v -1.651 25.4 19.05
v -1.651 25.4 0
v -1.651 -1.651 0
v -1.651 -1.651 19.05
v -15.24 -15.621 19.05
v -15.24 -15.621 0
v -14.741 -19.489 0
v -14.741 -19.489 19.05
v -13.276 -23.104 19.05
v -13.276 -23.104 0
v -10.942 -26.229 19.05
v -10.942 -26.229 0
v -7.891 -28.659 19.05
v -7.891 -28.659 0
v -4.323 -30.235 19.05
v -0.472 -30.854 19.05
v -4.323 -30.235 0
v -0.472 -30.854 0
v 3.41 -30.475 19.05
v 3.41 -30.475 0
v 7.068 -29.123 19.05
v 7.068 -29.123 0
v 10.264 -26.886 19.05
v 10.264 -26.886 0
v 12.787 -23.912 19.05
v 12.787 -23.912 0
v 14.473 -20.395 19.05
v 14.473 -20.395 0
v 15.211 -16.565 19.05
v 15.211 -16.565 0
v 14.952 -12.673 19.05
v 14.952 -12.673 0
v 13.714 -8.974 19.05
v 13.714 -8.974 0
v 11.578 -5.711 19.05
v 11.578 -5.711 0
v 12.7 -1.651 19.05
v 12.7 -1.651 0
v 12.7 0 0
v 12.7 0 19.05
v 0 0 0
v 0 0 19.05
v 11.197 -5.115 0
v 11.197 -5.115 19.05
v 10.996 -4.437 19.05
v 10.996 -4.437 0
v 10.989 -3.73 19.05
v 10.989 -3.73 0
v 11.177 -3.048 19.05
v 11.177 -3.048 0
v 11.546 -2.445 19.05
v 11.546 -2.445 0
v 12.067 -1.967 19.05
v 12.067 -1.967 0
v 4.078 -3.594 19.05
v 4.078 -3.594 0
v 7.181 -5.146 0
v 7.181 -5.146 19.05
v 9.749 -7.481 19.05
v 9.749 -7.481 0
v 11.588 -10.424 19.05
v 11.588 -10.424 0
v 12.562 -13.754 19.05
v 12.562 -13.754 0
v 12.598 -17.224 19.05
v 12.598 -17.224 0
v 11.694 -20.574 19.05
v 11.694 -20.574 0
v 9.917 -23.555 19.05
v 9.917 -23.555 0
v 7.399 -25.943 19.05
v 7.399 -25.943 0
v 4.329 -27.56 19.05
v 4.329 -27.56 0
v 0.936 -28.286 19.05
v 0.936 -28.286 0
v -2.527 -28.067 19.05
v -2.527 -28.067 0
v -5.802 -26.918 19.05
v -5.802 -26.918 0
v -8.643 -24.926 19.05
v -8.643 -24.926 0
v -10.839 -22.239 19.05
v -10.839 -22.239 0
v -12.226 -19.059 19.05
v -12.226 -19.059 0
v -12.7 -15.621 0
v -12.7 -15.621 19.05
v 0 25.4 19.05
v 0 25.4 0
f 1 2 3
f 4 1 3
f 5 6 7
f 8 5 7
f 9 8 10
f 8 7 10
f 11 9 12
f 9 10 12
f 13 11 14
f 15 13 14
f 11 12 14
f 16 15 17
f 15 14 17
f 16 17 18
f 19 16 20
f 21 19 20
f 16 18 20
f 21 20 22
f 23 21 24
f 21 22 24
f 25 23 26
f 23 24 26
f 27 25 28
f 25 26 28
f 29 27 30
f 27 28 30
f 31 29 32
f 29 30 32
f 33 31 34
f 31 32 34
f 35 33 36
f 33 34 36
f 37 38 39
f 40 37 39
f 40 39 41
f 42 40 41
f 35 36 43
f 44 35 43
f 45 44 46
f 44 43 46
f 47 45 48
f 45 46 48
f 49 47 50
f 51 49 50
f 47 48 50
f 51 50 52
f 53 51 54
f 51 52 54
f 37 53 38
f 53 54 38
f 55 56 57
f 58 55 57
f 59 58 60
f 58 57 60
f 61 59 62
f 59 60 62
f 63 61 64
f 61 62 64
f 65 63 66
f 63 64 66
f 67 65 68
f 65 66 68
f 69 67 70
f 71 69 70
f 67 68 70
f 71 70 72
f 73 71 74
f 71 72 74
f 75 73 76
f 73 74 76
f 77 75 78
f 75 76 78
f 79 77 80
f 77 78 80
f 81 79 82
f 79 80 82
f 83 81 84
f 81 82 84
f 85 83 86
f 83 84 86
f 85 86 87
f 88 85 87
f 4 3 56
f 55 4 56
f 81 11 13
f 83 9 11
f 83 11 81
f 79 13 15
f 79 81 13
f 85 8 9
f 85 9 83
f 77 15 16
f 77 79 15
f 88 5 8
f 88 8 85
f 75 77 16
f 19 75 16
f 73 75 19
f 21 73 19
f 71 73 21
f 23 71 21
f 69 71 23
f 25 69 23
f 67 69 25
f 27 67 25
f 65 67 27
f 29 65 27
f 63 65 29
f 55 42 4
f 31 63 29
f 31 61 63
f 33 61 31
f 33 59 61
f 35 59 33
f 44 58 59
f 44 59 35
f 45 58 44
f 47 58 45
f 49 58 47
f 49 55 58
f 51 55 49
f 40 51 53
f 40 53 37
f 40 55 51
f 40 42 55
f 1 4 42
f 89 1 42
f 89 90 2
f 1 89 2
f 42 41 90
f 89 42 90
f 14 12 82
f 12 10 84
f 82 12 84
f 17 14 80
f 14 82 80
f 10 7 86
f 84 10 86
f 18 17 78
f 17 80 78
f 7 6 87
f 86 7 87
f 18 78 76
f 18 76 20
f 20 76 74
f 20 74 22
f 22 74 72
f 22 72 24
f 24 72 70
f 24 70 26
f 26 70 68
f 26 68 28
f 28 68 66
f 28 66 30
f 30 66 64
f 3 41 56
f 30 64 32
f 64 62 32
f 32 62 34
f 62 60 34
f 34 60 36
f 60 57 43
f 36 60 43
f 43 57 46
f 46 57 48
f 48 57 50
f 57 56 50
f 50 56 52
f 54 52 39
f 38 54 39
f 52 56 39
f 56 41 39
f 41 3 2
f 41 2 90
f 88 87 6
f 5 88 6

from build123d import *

# Parameters (mm, degrees)
F1_DEPTH    = 19.05
F2_T1_DEPTH = 19.05


# Not quite as in the source:
# - a fillet or chamfer that OpenCascade refuses, or shapes differently, is made with other operations: its cross-section is extruded or revolved along the edge and cut away or added


with BuildPart() as f1:
    # F0 (on Top) → F1 (new body)
    with BuildSketch(Plane.XY):
        Polygon((12.7, 0), (0, 0), (0, -1.651), (6.35, -1.651), (12.7, -1.651), align=None)
        Polygon((0, -1.651), (0, 0), (0, 25.4), (-1.651, 25.4), (-1.651, -1.651), align=None)
        with BuildLine():
            Line((6.35, -1.651), (0, -1.651))
            Line((0, -1.651), (-1.651, -1.651))
            Line((-1.651, -1.651), (4.0781423077, -3.5935831818))
            ThreePointArc((4.0781423077, -3.5935831818), (7.3992429576, -25.9428798508), (-12.7, -15.621))
            Line((-12.7, -15.621), (-15.24, -15.621))
            ThreePointArc((-15.24, -15.621), (7.485390628, -28.8960339791), (7.8868408329, -2.5804731058))
            Line((7.8868408329, -2.5804731058), (6.35, -1.651))
        make_face()
    extrude(amount=F1_DEPTH)

    # F2: fillet of radius 2.54 on 1 edges, made by hand

    # F2_s2 → F2_t1 (join)
    with BuildSketch(Plane.XY):
        with BuildLine():
            ThreePointArc((11.5778863285, -5.7108966623), (11.0593242469, -3.3825527689), (12.7, -1.651))
            Line((12.7, -1.651), (12.619246595, -1.4101787227))
            ThreePointArc((12.619246595, -1.4101787227), (9.525, -1.397), (6.35, -1.397))
            Line((6.35, -1.397), (6.2185526528, -1.8683421149))
            ThreePointArc((6.2185526528, -1.8683421149), (7.7553934856, -2.7978152207), (11.3849215563, -5.8760650512))
            Line((11.3849215563, -5.8760650512), (11.5778863285, -5.7108966623))
        make_face()
    extrude(amount=F2_T1_DEPTH)


solid = f1.part
